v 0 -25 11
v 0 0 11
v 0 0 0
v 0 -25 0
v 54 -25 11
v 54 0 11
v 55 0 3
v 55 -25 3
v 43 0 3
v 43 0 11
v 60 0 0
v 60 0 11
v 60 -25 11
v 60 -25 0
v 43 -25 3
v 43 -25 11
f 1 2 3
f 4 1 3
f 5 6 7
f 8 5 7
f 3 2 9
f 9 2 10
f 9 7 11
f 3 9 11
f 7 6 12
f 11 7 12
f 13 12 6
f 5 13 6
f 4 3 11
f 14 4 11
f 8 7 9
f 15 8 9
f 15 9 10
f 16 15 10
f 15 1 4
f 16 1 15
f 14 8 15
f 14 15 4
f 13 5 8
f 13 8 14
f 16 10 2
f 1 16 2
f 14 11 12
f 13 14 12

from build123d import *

# Parameters (mm, degrees)
EXTRUDE_DEPTH           = 25
EXTRUDE_PLACEMENT_ANGLE = 90


with BuildPart() as part:
    # Sketch → Extrude (new body)
    with BuildSketch(Plane.XY):
        Polygon((0, 11), (0, 0), (60, 0), (60, 11), (54, 11), (55, 3), (43, 3), (43, 11), align=None)
    extrude(amount=EXTRUDE_DEPTH)


with BuildPart() as part_1:
    # Extrude placement: moved
    add(part.part.rotate(Axis((0, 0, 0), (1, 0, 0)), EXTRUDE_PLACEMENT_ANGLE))


solid = part_1.part
